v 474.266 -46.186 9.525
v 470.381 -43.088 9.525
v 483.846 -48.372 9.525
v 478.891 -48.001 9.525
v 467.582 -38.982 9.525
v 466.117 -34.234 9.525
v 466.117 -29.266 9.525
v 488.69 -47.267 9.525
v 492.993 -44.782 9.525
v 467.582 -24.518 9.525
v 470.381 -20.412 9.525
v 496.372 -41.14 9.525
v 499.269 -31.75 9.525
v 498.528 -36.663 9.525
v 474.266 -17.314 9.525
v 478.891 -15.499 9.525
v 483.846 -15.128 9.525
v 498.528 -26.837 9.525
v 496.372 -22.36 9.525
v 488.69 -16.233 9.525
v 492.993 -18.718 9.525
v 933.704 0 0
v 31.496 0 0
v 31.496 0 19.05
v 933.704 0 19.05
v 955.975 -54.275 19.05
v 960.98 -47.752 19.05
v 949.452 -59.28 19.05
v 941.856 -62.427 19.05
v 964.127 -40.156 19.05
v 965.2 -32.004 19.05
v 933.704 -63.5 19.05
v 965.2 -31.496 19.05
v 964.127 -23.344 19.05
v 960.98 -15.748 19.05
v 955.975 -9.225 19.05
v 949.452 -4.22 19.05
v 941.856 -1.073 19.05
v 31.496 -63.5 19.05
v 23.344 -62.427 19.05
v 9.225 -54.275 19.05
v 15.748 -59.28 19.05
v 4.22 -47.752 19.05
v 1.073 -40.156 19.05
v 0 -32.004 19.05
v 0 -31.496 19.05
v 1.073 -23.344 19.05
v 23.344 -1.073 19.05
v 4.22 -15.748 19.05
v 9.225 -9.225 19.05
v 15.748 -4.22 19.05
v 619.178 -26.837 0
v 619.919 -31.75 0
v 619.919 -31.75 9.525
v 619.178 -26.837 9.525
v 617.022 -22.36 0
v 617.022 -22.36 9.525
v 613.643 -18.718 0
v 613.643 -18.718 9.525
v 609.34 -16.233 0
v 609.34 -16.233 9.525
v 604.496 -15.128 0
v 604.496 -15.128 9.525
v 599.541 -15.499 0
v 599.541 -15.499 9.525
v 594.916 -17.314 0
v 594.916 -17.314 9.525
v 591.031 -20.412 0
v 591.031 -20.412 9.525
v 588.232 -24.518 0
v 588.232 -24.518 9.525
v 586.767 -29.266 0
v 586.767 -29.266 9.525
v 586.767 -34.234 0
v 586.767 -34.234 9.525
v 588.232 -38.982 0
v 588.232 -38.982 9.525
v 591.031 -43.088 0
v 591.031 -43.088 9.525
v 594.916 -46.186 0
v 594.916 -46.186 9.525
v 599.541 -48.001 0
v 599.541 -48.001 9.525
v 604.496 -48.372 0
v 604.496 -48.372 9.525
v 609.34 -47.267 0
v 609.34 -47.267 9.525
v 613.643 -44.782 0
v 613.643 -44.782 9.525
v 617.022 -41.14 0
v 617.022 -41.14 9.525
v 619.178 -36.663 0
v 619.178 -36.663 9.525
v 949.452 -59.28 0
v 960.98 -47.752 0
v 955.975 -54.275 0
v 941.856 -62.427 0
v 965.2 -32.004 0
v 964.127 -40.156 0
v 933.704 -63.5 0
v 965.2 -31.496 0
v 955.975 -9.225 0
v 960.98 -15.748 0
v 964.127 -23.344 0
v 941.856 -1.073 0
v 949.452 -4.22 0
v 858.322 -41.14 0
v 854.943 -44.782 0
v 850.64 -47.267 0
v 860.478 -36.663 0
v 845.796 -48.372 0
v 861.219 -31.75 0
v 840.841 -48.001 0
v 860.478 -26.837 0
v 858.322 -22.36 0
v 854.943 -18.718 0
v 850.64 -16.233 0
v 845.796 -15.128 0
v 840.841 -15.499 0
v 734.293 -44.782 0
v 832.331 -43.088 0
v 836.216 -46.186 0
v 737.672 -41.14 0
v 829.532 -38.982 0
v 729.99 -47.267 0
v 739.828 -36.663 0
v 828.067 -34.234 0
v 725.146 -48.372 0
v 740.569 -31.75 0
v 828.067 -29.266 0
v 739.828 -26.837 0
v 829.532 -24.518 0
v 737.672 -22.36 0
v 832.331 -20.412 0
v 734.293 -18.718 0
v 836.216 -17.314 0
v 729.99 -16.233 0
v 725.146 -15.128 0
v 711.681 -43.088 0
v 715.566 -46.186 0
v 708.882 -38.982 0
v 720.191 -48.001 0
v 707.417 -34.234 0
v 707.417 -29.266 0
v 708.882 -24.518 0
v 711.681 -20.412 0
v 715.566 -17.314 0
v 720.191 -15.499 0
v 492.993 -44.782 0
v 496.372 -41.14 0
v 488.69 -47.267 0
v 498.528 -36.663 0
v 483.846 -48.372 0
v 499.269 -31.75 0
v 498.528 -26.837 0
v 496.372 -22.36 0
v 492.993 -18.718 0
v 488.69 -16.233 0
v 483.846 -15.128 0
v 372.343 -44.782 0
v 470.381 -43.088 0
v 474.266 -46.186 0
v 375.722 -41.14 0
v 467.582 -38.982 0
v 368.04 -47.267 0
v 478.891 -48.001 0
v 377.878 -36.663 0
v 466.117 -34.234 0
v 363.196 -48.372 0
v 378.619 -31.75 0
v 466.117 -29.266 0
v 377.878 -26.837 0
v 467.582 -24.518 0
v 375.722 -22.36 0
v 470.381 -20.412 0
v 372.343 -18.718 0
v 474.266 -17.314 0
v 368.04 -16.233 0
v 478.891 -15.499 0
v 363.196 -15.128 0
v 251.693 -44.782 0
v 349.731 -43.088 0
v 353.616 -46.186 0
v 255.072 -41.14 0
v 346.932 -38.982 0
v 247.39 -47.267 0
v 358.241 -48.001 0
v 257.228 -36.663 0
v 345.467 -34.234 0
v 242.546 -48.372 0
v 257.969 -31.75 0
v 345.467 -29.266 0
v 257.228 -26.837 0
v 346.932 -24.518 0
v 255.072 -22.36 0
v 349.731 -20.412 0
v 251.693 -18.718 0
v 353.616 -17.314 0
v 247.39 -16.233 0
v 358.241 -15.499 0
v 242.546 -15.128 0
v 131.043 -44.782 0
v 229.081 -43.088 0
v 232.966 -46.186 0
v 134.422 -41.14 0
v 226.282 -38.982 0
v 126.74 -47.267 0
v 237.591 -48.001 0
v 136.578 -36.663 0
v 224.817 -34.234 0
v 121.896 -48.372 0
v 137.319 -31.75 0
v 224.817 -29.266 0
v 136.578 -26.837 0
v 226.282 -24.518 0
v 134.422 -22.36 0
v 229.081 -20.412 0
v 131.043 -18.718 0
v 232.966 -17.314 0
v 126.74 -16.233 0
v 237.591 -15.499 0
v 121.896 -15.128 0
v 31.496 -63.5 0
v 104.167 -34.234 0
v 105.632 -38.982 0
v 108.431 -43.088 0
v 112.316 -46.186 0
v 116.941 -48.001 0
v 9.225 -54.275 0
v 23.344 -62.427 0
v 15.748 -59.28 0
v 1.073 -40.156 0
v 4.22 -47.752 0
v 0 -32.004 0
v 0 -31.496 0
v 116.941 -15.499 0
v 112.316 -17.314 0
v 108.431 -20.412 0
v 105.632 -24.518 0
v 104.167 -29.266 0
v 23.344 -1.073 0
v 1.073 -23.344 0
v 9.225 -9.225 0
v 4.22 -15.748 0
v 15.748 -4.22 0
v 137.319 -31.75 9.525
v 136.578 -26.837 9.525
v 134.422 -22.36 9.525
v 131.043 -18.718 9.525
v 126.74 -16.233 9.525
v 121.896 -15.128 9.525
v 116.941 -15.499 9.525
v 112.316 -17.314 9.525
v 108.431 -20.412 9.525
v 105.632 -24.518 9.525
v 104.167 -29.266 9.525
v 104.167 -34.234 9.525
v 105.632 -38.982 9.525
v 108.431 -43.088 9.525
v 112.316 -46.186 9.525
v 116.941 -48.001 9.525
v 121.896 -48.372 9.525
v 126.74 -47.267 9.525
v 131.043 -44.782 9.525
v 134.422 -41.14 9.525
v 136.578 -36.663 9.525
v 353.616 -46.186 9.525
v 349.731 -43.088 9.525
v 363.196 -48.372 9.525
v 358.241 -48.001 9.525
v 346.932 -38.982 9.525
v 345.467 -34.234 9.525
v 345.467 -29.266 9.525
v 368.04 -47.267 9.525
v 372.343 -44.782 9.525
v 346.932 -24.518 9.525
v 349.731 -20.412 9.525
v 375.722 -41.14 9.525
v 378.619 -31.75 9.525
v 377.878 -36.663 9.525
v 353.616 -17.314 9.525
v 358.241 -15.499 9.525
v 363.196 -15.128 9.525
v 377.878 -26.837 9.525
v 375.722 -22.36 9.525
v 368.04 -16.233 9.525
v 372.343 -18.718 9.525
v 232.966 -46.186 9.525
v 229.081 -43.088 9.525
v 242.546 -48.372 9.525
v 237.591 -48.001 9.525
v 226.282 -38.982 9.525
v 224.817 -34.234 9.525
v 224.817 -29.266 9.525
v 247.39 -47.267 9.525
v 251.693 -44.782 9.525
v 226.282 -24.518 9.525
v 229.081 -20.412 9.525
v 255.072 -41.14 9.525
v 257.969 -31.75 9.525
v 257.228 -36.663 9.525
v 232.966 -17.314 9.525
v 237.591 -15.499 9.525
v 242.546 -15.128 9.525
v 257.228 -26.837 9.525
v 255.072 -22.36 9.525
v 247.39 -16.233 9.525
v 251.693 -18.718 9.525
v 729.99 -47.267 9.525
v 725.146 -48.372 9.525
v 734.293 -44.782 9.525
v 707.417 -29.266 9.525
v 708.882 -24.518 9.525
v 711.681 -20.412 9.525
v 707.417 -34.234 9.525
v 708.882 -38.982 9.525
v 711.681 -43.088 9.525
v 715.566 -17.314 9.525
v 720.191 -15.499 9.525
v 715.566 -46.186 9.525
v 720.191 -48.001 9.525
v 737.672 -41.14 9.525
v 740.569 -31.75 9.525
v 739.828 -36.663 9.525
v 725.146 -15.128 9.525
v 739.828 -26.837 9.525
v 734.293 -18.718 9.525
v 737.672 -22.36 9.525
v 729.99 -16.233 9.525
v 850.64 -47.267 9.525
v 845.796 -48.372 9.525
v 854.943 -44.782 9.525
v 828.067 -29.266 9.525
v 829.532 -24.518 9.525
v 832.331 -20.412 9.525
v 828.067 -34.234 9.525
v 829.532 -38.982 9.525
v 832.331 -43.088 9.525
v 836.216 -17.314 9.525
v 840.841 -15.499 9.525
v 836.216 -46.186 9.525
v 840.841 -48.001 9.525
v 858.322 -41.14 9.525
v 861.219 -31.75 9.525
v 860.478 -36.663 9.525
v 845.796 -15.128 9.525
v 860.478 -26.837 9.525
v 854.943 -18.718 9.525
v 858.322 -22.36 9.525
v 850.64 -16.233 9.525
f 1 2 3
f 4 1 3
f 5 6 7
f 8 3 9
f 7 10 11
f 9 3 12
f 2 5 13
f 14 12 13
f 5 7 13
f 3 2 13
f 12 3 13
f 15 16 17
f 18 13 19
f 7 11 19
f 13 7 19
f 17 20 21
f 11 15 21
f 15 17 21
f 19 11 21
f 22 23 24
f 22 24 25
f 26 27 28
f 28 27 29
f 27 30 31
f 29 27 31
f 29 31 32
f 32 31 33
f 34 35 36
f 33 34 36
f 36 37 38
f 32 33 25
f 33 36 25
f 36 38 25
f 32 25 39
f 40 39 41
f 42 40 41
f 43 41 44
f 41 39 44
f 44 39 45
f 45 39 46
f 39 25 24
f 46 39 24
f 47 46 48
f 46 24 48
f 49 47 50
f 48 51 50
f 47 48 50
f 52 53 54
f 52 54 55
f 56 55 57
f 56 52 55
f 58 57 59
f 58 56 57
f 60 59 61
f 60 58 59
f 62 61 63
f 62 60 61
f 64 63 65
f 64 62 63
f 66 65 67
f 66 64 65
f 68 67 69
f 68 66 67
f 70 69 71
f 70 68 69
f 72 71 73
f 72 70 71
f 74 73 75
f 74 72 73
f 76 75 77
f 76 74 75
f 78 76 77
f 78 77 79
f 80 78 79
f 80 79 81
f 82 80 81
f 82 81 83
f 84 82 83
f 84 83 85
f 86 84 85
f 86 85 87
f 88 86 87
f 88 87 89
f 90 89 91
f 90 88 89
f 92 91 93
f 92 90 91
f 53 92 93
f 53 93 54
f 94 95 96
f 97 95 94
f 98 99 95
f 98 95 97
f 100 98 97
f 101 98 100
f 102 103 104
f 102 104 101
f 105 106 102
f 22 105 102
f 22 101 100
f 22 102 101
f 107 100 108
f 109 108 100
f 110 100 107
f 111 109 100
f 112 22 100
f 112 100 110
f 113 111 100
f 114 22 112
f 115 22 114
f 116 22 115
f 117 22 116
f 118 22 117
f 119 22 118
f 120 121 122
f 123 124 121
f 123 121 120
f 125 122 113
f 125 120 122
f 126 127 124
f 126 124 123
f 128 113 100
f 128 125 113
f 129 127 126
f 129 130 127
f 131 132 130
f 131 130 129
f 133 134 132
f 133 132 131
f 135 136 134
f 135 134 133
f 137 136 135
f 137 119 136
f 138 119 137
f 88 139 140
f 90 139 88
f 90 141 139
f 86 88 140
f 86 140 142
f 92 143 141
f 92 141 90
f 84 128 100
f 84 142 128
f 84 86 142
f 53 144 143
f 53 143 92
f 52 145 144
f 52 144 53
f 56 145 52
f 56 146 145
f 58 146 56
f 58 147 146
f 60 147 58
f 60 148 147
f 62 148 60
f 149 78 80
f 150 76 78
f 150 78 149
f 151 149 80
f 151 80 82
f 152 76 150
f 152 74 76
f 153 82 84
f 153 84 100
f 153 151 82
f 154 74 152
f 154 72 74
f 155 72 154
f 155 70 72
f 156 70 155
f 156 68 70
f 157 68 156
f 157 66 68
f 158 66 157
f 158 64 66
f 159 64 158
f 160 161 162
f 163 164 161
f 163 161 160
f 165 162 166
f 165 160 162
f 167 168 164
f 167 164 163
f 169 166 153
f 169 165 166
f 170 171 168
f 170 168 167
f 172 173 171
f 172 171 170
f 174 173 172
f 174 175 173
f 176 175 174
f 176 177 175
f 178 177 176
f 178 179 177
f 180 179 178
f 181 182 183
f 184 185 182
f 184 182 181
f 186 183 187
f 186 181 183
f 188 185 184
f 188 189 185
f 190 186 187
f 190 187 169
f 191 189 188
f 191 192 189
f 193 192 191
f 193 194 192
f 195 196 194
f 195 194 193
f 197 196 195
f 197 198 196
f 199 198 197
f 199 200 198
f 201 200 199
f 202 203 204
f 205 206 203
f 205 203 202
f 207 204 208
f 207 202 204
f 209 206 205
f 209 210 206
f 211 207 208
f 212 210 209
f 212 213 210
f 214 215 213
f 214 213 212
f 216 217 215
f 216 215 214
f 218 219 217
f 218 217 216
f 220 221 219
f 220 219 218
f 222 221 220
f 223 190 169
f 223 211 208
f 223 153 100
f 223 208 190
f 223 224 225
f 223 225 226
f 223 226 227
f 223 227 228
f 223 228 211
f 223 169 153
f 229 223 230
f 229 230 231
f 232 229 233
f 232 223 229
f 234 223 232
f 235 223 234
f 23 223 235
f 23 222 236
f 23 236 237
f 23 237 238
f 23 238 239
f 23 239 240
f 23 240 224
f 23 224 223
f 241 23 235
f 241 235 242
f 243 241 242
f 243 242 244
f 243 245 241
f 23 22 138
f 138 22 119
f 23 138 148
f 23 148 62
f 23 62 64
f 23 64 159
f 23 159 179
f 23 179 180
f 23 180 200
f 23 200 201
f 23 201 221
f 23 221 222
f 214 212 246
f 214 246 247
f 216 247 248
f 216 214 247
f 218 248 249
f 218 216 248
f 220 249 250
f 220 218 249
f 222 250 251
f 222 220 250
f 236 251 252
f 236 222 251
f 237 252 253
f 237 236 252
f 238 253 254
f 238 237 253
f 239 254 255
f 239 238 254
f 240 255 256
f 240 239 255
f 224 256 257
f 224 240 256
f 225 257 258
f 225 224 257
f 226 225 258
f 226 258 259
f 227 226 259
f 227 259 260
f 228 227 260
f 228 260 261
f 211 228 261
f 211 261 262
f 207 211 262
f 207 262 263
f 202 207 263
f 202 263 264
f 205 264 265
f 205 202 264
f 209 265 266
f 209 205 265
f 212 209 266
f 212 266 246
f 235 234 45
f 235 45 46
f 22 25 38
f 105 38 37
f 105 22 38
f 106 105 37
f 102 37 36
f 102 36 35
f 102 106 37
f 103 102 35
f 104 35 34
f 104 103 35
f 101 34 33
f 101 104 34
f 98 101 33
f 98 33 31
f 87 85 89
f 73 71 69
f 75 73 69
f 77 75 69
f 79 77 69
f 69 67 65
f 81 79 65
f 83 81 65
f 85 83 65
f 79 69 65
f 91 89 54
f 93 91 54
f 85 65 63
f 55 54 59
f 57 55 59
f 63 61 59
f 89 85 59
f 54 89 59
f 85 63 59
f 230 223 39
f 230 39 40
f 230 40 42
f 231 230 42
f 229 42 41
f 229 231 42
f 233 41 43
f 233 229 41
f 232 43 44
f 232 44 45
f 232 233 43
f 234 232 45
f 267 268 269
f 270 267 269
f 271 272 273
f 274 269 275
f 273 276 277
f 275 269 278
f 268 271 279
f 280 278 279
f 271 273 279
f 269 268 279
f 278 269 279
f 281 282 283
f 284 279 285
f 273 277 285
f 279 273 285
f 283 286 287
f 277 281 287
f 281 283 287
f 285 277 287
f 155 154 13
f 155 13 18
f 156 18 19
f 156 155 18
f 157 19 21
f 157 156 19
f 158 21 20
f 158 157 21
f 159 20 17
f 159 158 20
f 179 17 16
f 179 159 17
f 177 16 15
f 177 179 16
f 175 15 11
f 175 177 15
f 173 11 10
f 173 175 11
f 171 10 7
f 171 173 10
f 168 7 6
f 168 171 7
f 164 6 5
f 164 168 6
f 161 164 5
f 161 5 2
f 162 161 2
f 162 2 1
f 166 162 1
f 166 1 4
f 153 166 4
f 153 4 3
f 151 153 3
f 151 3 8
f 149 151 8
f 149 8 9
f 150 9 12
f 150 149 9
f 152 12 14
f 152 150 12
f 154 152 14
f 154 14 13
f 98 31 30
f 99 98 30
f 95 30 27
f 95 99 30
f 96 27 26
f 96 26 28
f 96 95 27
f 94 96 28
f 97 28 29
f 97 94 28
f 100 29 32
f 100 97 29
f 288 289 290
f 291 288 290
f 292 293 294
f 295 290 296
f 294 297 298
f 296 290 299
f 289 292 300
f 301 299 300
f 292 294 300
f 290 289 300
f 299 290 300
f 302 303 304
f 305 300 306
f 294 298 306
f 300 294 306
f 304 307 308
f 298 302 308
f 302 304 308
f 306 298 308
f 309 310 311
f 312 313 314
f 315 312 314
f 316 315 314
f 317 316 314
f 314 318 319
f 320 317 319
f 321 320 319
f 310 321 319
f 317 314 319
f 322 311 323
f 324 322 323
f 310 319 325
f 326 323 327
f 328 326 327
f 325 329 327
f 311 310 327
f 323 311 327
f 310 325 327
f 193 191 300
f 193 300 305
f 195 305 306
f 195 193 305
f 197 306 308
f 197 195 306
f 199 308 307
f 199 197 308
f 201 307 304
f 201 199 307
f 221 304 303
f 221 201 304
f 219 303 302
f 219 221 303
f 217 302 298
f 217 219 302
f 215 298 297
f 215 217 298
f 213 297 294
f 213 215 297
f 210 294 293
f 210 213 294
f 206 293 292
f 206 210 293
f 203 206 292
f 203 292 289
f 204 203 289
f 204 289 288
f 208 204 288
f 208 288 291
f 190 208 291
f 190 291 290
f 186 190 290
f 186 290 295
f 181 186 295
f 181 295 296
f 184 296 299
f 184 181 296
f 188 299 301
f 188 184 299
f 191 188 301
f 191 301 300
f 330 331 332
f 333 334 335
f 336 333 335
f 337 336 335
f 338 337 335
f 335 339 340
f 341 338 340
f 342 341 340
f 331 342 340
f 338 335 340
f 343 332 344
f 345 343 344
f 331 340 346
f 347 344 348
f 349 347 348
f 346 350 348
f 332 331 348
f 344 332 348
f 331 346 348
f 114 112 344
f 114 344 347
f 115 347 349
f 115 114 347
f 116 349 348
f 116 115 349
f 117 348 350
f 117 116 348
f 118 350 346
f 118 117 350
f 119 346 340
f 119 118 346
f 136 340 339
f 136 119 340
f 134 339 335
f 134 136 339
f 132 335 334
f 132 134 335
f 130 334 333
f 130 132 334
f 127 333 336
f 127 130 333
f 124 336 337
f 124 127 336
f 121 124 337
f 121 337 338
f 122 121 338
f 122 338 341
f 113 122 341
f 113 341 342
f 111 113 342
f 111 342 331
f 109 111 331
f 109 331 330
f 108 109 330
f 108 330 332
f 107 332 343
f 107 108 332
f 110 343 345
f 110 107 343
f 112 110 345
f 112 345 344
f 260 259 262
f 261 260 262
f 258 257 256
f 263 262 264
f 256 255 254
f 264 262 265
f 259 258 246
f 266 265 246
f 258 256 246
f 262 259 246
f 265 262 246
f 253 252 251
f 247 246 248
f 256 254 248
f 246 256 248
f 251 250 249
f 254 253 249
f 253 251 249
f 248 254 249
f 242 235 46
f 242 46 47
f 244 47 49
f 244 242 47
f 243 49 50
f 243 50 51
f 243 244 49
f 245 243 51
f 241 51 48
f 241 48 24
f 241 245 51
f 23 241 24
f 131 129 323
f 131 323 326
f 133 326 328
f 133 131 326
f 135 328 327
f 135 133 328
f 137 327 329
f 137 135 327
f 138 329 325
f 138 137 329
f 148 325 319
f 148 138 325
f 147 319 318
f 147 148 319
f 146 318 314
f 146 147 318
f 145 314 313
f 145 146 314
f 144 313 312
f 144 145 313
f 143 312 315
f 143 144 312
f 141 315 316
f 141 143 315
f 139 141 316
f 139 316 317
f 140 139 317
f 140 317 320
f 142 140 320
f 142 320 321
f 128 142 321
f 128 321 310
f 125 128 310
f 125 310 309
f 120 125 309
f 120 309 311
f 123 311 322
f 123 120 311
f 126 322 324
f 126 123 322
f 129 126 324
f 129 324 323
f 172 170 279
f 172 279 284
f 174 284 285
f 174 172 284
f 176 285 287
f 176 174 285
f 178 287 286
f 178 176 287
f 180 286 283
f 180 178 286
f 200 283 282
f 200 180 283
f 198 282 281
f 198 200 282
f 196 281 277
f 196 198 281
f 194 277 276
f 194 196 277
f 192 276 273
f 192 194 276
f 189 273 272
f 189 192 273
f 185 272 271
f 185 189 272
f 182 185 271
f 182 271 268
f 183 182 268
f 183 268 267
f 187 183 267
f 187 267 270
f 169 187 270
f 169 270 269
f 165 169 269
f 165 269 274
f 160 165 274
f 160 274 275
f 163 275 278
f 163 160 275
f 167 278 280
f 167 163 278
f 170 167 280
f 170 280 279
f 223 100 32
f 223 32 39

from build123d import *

# Parameters (mm, degrees)
BOSS_EXTRUDE1_DEPTH = 19.05
SKETCH3_R           = 16.66875
CUT_EXTRUDE1_DEPTH  = 9.525


with BuildPart() as part:
    # Sketch2 → Boss-Extrude1 (new body)
    with BuildSketch(Plane.XY):
        with BuildLine():
            Line((31.496, 0), (933.704, 0))
            ThreePointArc((933.704, 0), (955.97503518, -9.22496482), (965.2, -31.496))
            Line((965.2, -31.496), (965.2, -32.004))
            ThreePointArc((965.2, -32.004), (955.97503518, -54.27503518), (933.704, -63.5))
            Line((933.704, -63.5), (31.496, -63.5))
            ThreePointArc((31.496, -63.5), (9.22496482, -54.27503518), (0, -32.004))
            Line((0, -32.004), (0, -31.496))
            ThreePointArc((0, -31.496), (9.22496482, -9.22496482), (31.496, 0))
        make_face()
    extrude(amount=BOSS_EXTRUDE1_DEPTH)

    # Sketch3 → Cut-Extrude1 (cut)
    with BuildSketch(Plane.XY):
        with Locations((844.55, -31.75)):
            Circle(SKETCH3_R)
        with Locations((723.9, -31.75)):
            Circle(SKETCH3_R)
        with Locations((603.25, -31.75)):
            Circle(SKETCH3_R)
        with Locations((482.6, -31.75)):
            Circle(SKETCH3_R)
        with Locations((361.95, -31.75)):
            Circle(SKETCH3_R)
        with Locations((241.3, -31.75)):
            Circle(SKETCH3_R)
        with Locations((120.65, -31.75)):
            Circle(SKETCH3_R)
    extrude(amount=CUT_EXTRUDE1_DEPTH, mode=Mode.SUBTRACT)


solid = part.part
